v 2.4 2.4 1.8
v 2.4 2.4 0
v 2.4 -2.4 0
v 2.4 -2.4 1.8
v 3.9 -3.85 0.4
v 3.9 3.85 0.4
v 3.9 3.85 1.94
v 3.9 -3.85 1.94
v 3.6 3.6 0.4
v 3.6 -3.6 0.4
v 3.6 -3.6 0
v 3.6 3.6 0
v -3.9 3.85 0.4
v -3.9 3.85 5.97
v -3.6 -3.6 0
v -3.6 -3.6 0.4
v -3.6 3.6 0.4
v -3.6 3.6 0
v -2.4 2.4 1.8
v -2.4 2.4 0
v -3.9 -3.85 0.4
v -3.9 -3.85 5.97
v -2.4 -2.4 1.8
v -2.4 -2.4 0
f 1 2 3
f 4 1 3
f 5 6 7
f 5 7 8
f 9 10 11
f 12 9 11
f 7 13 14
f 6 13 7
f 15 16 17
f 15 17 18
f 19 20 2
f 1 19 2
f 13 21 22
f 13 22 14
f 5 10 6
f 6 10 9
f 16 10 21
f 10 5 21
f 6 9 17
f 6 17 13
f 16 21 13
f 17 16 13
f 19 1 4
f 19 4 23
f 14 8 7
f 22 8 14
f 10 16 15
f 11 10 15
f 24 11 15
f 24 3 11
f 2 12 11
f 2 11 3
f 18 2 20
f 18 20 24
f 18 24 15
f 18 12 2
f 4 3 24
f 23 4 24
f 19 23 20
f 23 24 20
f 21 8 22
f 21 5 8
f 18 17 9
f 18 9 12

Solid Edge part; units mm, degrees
sketch "Sketch1" plane through (0, 0, 0) normal (0, 0, -1) x (-1, 0, 0)
  line L0 (-3.9, -3.85) -> (3.9, -3.85)
  line L1 (3.9, -3.85) -> (3.9, 3.85)
  line L2 (3.9, 3.85) -> (-3.9, 3.85)
  line L3 (-3.9, 3.85) -> (-3.9, -3.85)
  dimension "D1" = 7.8
  dimension "D2" = 7.7
extrude "Protrusion1" add sketch "Sketch1" against normal blind 5.97
sketch "Sketch2" plane through (0, -3.85, 2.985) normal (0, -1, 0) x (1, 0, 0)
  line L0 (-3.9, 2.985) -> (3.9, 2.985)
  line L1 (3.9, 2.985) -> (3.9, -1.045)
  line L2 (3.9, -1.045) -> (-3.9, 2.985)
  dimension "D1" = 4.03
extrude "ExtrudedCutout_1" cut sketch "Sketch2" against normal blind 12.0859
sketch "Sketch3" plane through (0, -3.85, 2.985) normal (0, -1, 0) x (1, 0, 0)
  line L0 (3.9, -2.585) -> (3.9, -3.3266)
  line L1 (3.9, -3.3266) -> (-3.9, -3.3266)
  line L2 (-3.9, -2.585) -> (-3.9, -3.3266)
  line L3 (-3.9, -2.585) -> (-3.6, -2.585)
  line L4 (-3.6, -2.585) -> (-3.6, -2.985)
  line L5 (3.6, -2.985) -> (-3.6, -2.985)
  line L6 (3.6, -2.585) -> (3.6, -2.985)
  line L7 (3.9, -2.585) -> (3.6, -2.585)
  dimension "D1" = 0.3
  dimension "D2" = 0.3
extrude "ExtrudedCutout_2" cut sketch "Sketch3" against normal blind 9.1473
sketch "Sketch4" plane through (0, 0, 0) normal (0, 0, -1) x (0, -1, 0)
  line L0 (-2.4, -2.4) -> (2.4, -2.4)
  line L1 (2.4, -2.4) -> (2.4, 2.4)
  line L2 (2.4, 2.4) -> (-2.4, 2.4)
  line L3 (-2.4, 2.4) -> (-2.4, -2.4)
  dimension "D1" = 4.8
  dimension "D2" = 4.8
extrude "ExtrudedCutout_4" cut sketch "Sketch4" against normal blind 1.8
sketch "Sketch5" plane through (-3.9, 0, 3.185) normal (-1, 0, 0) x (0, -1, 0)
  line L0 (3.85, -2.785) -> (3.6, -2.785)
  line L1 (3.6, -2.785) -> (3.6, -3.185)
  line L2 (-3.6, -3.185) -> (3.6, -3.185)
  line L3 (-3.6, -2.785) -> (-3.6, -3.185)
  line L4 (-3.85, -2.785) -> (-3.6, -2.785)
  line L5 (-3.85, -3.5485) -> (-3.85, -2.785)
  line L6 (3.85, -3.5485) -> (-3.85, -3.5485)
  line L7 (3.85, -2.785) -> (3.85, -3.5485)
  dimension "D1" = 0.25
  dimension "D2" = 0.25
extrude "ExtrudedCutout_5" cut sketch "Sketch5" against normal blind 8.7278
